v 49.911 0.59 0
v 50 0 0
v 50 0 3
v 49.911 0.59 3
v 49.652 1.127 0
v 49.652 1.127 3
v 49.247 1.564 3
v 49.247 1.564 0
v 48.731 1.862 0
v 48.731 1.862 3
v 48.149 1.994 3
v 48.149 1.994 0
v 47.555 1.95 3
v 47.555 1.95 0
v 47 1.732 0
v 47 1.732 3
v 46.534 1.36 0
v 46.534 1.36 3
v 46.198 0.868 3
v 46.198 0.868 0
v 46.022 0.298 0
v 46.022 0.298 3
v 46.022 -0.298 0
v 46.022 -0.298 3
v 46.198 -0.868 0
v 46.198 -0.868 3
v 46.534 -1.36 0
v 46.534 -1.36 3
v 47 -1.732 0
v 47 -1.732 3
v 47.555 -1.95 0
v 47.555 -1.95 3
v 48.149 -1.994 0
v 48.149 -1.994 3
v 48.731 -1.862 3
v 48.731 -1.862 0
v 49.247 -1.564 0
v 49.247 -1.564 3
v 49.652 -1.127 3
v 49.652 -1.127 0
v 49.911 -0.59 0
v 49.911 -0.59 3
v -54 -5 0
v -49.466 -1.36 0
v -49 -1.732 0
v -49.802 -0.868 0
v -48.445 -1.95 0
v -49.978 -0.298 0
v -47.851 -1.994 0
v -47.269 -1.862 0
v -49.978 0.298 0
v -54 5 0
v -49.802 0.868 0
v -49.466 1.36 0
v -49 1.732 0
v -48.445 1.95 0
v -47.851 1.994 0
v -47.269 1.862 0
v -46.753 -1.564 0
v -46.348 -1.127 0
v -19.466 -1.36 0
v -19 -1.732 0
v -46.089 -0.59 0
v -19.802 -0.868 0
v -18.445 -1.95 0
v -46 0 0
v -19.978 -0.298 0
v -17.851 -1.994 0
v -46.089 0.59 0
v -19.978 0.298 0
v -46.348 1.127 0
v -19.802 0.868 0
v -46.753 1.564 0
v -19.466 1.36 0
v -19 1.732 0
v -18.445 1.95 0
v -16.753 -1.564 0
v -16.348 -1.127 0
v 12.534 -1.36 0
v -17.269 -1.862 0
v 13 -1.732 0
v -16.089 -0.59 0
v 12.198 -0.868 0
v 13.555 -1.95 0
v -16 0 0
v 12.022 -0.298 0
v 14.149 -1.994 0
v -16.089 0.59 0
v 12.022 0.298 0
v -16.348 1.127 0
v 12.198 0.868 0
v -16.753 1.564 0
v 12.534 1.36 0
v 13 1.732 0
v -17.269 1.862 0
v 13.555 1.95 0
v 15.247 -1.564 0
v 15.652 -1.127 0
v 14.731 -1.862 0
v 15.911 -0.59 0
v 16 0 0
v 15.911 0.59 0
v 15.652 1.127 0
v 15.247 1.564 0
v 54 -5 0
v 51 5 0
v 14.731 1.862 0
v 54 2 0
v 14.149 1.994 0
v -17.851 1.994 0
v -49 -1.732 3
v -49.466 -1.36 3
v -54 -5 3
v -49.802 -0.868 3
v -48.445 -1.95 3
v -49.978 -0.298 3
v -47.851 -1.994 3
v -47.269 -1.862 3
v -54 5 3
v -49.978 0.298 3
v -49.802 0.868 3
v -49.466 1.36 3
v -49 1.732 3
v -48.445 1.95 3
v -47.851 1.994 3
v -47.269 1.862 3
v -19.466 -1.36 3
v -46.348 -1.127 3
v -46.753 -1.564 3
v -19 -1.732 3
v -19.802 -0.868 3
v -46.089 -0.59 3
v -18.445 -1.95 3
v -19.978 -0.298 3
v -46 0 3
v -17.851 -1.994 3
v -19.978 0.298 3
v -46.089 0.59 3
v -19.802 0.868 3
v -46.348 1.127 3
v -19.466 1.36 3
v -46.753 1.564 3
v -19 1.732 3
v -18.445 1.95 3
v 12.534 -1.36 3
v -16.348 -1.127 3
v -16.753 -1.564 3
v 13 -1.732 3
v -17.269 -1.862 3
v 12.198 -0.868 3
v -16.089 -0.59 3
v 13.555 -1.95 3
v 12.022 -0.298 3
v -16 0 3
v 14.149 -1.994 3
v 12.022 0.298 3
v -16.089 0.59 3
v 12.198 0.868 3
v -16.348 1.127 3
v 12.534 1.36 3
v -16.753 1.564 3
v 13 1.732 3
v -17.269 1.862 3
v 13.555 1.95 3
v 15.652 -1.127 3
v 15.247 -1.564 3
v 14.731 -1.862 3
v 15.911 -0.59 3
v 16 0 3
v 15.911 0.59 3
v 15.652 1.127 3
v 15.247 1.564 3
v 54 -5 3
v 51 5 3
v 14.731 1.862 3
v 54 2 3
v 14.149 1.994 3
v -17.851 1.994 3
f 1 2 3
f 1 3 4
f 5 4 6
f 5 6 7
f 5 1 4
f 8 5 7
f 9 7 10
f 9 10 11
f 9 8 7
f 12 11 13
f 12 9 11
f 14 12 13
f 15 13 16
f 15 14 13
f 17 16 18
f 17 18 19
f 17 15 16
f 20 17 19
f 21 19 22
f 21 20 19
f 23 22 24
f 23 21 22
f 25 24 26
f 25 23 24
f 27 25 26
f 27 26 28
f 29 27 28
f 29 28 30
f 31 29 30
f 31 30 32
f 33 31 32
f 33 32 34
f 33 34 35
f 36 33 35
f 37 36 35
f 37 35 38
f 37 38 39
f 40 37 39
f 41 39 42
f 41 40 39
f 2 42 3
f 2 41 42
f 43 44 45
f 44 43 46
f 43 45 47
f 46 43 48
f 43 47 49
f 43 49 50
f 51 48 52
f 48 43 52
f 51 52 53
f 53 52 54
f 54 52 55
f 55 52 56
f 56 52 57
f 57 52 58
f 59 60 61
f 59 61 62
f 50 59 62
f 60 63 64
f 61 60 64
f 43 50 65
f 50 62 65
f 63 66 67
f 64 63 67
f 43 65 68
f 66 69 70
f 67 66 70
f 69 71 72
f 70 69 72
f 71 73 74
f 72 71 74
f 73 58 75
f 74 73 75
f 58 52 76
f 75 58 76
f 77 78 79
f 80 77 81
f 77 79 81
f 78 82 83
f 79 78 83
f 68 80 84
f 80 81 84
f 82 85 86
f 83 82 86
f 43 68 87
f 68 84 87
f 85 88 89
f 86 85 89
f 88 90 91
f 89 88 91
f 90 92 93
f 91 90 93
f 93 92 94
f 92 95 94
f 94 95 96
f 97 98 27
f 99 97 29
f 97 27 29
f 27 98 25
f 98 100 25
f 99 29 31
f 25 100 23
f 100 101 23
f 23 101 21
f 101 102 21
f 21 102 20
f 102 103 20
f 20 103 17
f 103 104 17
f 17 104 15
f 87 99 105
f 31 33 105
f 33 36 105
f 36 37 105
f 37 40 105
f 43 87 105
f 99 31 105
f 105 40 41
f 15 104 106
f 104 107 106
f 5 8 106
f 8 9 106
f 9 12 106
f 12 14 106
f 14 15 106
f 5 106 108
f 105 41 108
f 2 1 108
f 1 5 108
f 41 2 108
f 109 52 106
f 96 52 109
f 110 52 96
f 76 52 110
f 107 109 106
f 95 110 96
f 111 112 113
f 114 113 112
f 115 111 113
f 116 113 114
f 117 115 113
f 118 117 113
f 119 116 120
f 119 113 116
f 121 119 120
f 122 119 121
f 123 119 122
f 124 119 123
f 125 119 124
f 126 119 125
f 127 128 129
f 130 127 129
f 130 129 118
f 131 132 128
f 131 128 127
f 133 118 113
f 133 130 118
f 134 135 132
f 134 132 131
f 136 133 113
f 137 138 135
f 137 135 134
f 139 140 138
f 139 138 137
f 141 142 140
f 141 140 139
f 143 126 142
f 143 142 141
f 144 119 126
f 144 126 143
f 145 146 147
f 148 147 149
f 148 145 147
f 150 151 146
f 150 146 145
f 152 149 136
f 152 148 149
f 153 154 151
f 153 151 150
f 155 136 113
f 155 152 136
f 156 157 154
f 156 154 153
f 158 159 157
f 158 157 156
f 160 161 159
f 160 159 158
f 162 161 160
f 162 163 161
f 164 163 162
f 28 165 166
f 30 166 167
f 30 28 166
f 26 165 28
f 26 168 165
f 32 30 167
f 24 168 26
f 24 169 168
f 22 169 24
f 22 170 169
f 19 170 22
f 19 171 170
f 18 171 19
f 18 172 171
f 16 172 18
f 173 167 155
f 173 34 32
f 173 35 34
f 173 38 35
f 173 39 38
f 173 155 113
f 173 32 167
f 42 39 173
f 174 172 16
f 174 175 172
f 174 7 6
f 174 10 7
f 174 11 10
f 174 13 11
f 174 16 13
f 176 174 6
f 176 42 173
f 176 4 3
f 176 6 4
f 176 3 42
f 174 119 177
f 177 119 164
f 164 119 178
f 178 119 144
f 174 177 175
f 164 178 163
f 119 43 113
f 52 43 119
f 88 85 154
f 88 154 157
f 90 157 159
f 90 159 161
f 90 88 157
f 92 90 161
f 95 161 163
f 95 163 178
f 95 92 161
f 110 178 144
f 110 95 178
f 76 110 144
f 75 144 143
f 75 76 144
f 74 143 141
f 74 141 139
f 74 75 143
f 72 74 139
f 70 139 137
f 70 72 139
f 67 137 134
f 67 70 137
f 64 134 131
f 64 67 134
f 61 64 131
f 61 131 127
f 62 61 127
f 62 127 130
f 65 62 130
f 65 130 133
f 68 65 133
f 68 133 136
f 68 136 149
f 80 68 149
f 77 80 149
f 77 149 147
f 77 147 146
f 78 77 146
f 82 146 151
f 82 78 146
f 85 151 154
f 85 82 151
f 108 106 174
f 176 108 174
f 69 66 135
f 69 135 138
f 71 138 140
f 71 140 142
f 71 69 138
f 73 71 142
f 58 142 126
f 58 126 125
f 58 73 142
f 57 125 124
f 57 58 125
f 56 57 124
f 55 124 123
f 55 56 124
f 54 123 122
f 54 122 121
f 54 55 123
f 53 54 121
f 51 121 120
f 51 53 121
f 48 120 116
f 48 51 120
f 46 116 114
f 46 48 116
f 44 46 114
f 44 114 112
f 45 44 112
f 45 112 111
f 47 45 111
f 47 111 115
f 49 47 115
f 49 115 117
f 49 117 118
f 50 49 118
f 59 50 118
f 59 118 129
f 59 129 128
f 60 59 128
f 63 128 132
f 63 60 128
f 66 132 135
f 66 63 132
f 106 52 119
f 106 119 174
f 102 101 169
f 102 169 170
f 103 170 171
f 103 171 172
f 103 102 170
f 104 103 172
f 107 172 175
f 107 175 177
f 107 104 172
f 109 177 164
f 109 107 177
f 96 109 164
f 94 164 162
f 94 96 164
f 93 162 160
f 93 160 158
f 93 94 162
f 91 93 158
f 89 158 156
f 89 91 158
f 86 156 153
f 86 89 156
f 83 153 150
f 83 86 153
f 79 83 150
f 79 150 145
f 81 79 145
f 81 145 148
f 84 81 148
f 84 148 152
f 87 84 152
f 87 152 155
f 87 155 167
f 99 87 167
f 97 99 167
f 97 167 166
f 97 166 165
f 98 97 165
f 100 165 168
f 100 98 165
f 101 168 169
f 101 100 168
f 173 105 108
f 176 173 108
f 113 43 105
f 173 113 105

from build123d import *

# Parameters (mm, degrees)
F0_W     = 108
F0_H     = 10
F0_R     = 2
F1_DEPTH = 3
F2_SIZE  = 3


with BuildPart() as f1:
    # F0 (on Top) → F1 (new body)
    with BuildSketch(Plane.XY):
        Rectangle(F0_W, F0_H)
        with Locations((-48, 0)):
            Circle(F0_R, mode=Mode.SUBTRACT)
        with Locations((-18, 0)):
            Circle(F0_R, mode=Mode.SUBTRACT)
        with Locations((14, 0)):
            Circle(F0_R, mode=Mode.SUBTRACT)
        with Locations((48, 0)):
            Circle(F0_R, mode=Mode.SUBTRACT)
    extrude(amount=F1_DEPTH)

    # F2
    f2_edges = [f1.edges().sort_by_distance(p)[0] for p in [
        (54, 5, 1.5),
    ]]
    chamfer(f2_edges, length=F2_SIZE)


solid = f1.part
